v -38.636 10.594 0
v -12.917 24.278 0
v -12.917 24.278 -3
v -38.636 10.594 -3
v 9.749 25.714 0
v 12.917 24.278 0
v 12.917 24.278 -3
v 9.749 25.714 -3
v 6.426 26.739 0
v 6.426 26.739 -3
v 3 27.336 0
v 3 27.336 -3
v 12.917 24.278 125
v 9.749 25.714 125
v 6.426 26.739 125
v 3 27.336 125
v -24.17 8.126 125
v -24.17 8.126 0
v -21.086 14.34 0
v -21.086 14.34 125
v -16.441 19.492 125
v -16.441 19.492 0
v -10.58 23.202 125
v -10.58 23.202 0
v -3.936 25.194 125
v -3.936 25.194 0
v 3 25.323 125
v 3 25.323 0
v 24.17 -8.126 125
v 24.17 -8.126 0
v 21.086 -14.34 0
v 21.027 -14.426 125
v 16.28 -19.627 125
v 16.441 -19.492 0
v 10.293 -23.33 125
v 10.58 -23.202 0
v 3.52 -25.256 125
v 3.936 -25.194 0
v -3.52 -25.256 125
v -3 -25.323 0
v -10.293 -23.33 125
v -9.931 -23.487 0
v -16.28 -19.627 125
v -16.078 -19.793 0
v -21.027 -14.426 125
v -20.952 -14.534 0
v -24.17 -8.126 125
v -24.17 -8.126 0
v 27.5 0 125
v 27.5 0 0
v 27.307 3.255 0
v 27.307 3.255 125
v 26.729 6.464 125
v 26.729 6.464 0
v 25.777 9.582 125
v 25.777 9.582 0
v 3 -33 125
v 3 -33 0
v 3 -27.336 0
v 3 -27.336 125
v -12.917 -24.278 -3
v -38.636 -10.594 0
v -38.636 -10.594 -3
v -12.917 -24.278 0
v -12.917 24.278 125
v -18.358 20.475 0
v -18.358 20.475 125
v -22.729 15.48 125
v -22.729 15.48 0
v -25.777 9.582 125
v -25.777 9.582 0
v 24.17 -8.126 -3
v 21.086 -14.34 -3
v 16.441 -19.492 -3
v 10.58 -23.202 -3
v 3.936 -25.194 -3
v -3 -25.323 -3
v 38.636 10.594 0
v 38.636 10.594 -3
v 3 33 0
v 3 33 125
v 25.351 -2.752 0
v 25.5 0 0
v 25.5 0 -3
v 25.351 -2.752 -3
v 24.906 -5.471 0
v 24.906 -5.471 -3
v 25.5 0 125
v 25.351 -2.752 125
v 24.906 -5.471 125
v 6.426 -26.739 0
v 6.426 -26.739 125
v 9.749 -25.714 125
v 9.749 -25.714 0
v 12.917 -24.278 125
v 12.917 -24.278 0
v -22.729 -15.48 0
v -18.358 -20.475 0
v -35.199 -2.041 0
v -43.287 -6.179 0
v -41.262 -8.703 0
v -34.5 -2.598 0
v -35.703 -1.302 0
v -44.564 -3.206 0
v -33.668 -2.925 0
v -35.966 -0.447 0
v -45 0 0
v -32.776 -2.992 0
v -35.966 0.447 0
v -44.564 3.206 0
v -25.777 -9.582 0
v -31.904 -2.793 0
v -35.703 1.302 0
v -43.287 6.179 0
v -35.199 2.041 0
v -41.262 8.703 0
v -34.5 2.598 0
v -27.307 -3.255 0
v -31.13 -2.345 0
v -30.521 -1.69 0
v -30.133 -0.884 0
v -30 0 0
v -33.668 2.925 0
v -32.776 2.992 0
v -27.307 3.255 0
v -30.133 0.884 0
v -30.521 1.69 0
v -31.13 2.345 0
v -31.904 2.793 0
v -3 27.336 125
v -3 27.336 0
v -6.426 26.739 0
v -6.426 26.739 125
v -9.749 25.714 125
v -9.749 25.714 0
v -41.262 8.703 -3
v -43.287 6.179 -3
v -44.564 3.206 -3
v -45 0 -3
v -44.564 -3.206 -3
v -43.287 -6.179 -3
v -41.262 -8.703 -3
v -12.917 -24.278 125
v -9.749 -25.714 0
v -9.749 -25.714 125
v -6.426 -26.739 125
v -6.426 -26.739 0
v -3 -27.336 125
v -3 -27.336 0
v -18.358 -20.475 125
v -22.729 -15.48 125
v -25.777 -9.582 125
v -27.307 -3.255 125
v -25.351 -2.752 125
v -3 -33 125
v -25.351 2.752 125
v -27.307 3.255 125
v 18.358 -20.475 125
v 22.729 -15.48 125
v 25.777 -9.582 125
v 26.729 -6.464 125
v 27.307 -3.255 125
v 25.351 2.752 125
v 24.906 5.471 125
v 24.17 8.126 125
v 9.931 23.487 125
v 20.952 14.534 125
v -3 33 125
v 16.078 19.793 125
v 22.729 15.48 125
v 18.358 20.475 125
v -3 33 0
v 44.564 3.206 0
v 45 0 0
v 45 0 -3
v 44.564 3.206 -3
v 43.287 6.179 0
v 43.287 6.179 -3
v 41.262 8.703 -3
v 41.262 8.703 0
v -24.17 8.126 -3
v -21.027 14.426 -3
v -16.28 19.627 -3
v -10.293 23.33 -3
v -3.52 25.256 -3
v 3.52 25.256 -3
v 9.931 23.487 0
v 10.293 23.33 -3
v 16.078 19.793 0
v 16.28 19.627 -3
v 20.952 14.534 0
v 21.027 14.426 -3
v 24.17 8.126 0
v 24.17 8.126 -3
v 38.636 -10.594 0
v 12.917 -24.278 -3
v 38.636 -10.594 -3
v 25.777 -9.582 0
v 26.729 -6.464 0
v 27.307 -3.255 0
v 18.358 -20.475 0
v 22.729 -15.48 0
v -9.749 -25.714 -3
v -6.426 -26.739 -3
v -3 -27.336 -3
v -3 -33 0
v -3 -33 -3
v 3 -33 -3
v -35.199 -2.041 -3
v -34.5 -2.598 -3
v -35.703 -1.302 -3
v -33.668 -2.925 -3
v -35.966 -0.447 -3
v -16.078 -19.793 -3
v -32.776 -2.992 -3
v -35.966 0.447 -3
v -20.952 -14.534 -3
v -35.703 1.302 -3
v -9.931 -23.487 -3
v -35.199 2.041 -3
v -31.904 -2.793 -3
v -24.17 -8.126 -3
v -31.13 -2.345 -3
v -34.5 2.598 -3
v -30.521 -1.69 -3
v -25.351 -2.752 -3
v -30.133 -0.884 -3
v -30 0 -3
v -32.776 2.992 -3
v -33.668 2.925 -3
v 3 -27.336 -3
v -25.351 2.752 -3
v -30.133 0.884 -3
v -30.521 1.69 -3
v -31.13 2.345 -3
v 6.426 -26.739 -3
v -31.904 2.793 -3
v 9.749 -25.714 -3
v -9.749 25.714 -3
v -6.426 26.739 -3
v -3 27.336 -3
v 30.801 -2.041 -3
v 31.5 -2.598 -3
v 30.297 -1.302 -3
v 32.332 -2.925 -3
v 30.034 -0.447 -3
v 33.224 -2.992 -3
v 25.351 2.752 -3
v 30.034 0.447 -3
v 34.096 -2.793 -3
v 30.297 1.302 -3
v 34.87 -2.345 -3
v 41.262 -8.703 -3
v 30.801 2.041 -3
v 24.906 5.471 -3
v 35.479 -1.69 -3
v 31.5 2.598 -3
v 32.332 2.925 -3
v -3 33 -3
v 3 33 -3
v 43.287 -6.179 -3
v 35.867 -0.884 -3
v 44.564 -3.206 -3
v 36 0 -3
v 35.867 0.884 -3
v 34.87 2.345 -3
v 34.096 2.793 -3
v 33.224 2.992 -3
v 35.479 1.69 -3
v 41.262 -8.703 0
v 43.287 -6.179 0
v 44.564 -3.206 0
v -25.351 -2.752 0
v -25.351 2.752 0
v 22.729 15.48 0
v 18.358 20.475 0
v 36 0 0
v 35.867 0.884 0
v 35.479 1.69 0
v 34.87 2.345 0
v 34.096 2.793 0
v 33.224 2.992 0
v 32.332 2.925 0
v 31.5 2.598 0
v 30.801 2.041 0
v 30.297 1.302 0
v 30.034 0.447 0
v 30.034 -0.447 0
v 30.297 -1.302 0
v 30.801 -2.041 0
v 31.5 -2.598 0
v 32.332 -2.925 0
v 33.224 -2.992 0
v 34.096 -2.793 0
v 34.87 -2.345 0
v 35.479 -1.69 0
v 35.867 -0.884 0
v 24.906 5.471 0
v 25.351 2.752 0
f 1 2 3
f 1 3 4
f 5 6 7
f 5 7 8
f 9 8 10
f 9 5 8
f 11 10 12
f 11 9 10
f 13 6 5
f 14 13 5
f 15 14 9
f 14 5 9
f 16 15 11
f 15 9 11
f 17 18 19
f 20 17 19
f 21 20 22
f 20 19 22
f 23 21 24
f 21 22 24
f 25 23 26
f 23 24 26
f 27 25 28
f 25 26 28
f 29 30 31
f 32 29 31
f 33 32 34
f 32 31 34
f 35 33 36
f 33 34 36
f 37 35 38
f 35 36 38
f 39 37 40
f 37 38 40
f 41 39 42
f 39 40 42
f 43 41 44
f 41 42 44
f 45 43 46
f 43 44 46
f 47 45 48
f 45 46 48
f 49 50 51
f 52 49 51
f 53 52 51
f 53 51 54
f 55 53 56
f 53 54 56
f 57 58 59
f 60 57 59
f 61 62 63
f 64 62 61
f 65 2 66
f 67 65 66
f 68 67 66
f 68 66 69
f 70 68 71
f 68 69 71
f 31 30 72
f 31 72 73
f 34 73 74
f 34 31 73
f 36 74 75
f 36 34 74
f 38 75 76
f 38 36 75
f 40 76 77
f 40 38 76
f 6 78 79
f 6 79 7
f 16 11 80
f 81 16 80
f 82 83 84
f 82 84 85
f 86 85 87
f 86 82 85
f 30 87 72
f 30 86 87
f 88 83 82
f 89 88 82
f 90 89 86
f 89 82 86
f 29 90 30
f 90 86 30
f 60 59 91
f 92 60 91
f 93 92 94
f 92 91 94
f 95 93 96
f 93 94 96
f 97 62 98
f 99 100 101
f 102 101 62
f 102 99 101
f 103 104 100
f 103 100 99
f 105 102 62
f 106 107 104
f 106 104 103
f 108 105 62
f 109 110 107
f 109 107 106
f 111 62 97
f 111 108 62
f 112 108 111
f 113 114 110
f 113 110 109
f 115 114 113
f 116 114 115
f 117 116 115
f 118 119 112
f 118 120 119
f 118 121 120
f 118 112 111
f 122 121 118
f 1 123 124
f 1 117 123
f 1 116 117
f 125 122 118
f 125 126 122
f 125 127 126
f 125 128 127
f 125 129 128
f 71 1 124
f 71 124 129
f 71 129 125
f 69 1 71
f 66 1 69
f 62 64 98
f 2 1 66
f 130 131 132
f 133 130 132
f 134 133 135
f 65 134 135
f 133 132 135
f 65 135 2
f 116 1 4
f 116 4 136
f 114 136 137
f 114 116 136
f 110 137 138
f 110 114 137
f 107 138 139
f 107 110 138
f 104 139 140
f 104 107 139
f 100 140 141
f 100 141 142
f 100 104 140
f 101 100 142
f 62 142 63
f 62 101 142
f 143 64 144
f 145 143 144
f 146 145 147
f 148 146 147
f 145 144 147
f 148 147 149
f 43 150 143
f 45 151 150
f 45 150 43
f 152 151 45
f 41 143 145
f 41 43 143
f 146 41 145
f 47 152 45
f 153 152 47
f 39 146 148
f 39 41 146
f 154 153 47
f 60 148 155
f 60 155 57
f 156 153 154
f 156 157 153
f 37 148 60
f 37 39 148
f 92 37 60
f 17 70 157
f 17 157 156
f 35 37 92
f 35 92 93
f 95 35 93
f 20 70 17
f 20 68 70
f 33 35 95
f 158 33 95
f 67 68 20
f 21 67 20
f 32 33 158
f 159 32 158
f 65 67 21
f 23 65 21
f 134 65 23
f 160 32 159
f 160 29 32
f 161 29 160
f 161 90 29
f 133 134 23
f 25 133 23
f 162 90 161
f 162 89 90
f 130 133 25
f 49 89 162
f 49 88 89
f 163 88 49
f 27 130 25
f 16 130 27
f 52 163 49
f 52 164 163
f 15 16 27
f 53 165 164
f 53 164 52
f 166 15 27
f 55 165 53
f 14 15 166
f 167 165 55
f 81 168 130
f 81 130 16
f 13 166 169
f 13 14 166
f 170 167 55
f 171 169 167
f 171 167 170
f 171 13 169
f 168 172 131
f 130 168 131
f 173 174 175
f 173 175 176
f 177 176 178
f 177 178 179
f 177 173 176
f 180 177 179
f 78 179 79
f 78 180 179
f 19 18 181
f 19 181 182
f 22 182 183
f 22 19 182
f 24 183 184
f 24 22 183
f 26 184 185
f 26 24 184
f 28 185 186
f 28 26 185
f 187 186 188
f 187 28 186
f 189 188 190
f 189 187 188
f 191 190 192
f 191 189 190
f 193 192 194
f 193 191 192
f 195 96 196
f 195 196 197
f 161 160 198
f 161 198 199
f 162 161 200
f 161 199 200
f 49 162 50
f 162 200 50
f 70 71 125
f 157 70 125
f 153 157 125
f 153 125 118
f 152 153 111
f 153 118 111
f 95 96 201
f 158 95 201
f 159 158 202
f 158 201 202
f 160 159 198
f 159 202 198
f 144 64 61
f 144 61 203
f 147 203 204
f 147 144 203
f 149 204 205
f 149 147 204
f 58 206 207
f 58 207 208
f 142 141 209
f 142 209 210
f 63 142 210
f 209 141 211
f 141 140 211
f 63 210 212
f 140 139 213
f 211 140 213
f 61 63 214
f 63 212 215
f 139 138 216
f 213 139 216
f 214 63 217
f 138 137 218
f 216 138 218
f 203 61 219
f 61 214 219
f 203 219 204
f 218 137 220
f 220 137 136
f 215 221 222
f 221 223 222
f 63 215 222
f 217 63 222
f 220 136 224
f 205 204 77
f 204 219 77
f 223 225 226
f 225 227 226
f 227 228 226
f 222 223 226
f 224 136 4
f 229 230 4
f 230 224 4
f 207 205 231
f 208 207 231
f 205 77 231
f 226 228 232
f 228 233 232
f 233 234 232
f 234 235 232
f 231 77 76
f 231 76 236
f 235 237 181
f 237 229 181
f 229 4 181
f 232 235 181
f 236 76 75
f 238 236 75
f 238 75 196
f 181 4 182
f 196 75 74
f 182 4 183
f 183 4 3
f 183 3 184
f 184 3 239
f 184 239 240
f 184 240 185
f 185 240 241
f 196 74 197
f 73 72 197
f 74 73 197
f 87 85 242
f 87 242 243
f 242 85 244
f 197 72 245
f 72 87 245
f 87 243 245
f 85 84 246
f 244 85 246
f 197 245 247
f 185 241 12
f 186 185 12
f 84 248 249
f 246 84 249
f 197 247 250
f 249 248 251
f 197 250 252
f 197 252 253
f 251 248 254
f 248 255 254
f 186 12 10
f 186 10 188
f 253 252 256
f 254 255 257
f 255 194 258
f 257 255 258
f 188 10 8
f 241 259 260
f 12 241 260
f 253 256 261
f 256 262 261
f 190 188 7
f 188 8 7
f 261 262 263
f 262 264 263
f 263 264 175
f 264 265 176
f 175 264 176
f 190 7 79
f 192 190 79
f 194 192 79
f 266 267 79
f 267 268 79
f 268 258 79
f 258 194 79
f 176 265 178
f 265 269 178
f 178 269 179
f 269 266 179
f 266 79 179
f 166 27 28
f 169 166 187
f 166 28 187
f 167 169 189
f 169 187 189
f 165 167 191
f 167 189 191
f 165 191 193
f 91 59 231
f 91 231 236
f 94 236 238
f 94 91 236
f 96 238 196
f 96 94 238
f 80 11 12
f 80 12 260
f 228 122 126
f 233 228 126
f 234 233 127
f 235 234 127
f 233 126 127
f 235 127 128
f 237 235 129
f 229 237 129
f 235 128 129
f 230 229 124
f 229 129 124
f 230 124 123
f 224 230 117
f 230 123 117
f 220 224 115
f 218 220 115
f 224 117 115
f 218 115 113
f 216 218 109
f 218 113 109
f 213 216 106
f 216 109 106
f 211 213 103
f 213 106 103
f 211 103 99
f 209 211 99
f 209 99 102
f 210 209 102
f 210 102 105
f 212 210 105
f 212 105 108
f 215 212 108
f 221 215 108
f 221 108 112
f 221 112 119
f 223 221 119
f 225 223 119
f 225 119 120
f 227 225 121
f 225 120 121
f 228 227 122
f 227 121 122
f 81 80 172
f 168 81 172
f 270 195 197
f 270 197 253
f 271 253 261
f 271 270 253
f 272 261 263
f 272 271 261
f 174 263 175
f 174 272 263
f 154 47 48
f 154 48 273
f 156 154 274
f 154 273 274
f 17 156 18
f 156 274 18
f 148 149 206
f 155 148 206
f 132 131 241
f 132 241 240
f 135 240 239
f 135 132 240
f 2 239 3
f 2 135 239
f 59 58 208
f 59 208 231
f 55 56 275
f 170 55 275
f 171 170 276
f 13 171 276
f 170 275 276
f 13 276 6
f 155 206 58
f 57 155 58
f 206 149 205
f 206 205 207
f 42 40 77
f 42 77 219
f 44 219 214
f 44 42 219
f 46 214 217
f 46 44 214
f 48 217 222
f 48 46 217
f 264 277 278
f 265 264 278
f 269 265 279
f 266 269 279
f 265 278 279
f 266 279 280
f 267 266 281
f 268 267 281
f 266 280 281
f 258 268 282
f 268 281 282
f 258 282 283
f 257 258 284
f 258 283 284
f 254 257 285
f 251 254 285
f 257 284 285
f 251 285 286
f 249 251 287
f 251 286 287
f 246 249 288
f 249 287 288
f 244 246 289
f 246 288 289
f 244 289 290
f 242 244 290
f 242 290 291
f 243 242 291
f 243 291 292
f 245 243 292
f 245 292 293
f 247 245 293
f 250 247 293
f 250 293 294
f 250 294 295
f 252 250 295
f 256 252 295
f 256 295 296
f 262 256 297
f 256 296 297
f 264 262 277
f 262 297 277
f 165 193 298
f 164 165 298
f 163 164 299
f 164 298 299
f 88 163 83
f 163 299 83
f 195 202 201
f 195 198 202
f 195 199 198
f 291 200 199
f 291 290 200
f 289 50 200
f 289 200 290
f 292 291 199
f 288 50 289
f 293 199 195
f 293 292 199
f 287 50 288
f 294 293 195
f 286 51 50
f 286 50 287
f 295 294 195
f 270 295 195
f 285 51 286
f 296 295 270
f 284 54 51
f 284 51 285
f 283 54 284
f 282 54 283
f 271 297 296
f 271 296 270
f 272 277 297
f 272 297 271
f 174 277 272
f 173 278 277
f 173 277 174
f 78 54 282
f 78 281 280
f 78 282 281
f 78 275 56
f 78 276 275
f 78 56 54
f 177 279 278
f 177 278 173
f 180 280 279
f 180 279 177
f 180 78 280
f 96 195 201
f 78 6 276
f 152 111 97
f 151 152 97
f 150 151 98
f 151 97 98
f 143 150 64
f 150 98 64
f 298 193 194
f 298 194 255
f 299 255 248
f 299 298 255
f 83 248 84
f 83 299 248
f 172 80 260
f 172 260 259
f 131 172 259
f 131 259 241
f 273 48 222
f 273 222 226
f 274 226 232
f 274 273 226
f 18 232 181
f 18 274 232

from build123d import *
from build123d import SkipClean  # not in build123d's __all__

# Parameters (mm, degrees)
F0_R     = 3
F1_DEPTH = 3
F2_DEPTH = 125


# Not quite as in the source:
# - a feature names something its author has since deleted; it is built from what else it names


with BuildPart() as f1:
    # F0 (on Top) → F1 (new body)
    with BuildSketch(Plane.XY):
        with BuildLine():
            ThreePointArc((12.9166666896, 24.2777618744), (20.6949130465, 18.1099578685), (25.7765151515, 9.5823413967))
            ThreePointArc((25.7765151515, 9.5823413967), (32.0589540907, 11.9630444535), (38.6363637791, 10.5939323837))
            Line((38.6363637791, 10.5939323837), (12.9166666896, 24.2777618744))
        make_face()
        with BuildLine():
            ThreePointArc((25.7765151515, 9.5823413967), (27.0656993875, 4.8680506023), (27.5, 0))
            ThreePointArc((27.5, 0), (27.0656993875, -4.8680506023), (25.7765151515, -9.5823413967))
            ThreePointArc((25.7765151515, -9.5823413967), (32.0589541175, -11.9630444556), (38.6363638266, -10.5939323584))
            ThreePointArc((38.6363638266, -10.5939323584), (43.2867965353, -6.1791437142), (45, 0))
            ThreePointArc((45, 0), (43.2867965215, 6.1791437372), (38.6363637791, 10.5939323837))
            ThreePointArc((38.6363637791, 10.5939323837), (32.0589540907, 11.9630444535), (25.7765151515, 9.5823413967))
        make_face()
        with Locations((33, 0)):
            Circle(F0_R, mode=Mode.SUBTRACT)
        with BuildLine():
            ThreePointArc((25.7765151515, -9.5823413967), (27.0656993875, -4.8680506023), (27.5, 0))
            ThreePointArc((27.5, 0), (27.0656993875, 4.8680506023), (25.7765151515, 9.5823413967))
            ThreePointArc((25.7765151515, 9.5823413967), (24.9405426226, 8.8907337595), (24.1704545455, 8.1264461523))
            ThreePointArc((24.1704545455, 8.1264461523), (25.1654186425, 4.117244776), (25.5, 0))
            ThreePointArc((25.5, 0), (25.1654186425, -4.117244776), (24.1704545455, -8.1264461523))
            ThreePointArc((24.1704545455, -8.1264461523), (24.9405426226, -8.8907337595), (25.7765151515, -9.5823413967))
        make_face()
        with BuildLine():
            ThreePointArc((-3, 27.3358738657), (0, 27.5), (3, 27.3358738657))
            Line((3, 27.3358738657), (3, 33))
            Line((3, 33), (-3, 33))
            Line((-3, 33), (-3, 27.3358738657))
        make_face()
        with BuildLine():
            ThreePointArc((38.6363638266, -10.5939323584), (32.0589541175, -11.9630444556), (25.7765151515, -9.5823413967))
            ThreePointArc((25.7765151515, -9.5823413967), (20.6949131964, -18.1099576972), (12.9166670915, -24.2777616606))
            Line((12.9166670915, -24.2777616606), (38.6363638266, -10.5939323584))
        make_face()
        with BuildLine():
            ThreePointArc((-25.7765151515, 9.5823413967), (-20.6949129227, 18.1099580099), (-12.9166663578, 24.2777620509))
            Line((-12.9166663578, 24.2777620509), (-38.636363452, 10.5939325577))
            ThreePointArc((-38.636363452, 10.5939325577), (-32.058953906, 11.963044439), (-25.7765151515, 9.5823413967))
        make_face()
        with BuildLine():
            ThreePointArc((-25.7765151515, -9.5823413967), (-27.5, 0), (-25.7765151515, 9.5823413967))
            ThreePointArc((-25.7765151515, 9.5823413967), (-32.058953906, 11.963044439), (-38.636363452, 10.5939325577))
            ThreePointArc((-38.636363452, 10.5939325577), (-45, 1.496e-07), (-38.6363637162, -10.5939324171))
            ThreePointArc((-38.6363637162, -10.5939324171), (-32.0589540552, -11.9630444507), (-25.7765151515, -9.5823413967))
        make_face()
        with Locations((-33, 0)):
            Circle(F0_R, mode=Mode.SUBTRACT)
        with BuildLine():
            ThreePointArc((-24.1704545455, -8.1264461523), (-25.5, 0), (-24.1704545455, 8.1264461523))
            ThreePointArc((-24.1704545455, 8.1264461523), (-24.9405426226, 8.8907337595), (-25.7765151515, 9.5823413967))
            ThreePointArc((-25.7765151515, 9.5823413967), (-27.5, 0), (-25.7765151515, -9.5823413967))
            ThreePointArc((-25.7765151515, -9.5823413967), (-24.9405426226, -8.8907337595), (-24.1704545455, -8.1264461523))
        make_face()
        with BuildLine():
            Line((-38.6363637162, -10.5939324171), (-12.9166665881, -24.2777619284))
            ThreePointArc((-12.9166665881, -24.2777619284), (-20.6949130086, -18.1099579118), (-25.7765151515, -9.5823413967))
            ThreePointArc((-25.7765151515, -9.5823413967), (-32.0589540552, -11.9630444507), (-38.6363637162, -10.5939324171))
        make_face()
        with BuildLine():
            Line((3, 25.3229145242), (3, 27.3358738657))
            ThreePointArc((3, 27.3358738657), (0, 27.5), (-3, 27.3358738657))
            Line((-3, 27.3358738657), (-3, 25.3229145242))
            ThreePointArc((-3, 25.3229145242), (0, 25.5), (3, 25.3229145242))
        make_face()
        with BuildLine():
            ThreePointArc((24.1704545455, 8.1264461523), (24.9405426226, 8.8907337595), (25.7765151515, 9.5823413967))
            ThreePointArc((25.7765151515, 9.5823413967), (20.6949130465, 18.1099578685), (12.9166666896, 24.2777618744))
            ThreePointArc((12.9166666896, 24.2777618744), (8.1038930067, 26.2788302277), (3, 27.3358738657))
            Line((3, 27.3358738657), (3, 25.3229145242))
            ThreePointArc((3, 25.3229145242), (16.0775629735, 19.7929777657), (24.1704545455, 8.1264461523))
        make_face()
        with BuildLine():
            Line((-3, 25.3229145242), (-3, 27.3358738657))
            ThreePointArc((-3, 27.3358738657), (-8.1038928272, 26.2788302831), (-12.9166663578, 24.2777620509))
            ThreePointArc((-12.9166663578, 24.2777620509), (-20.6949129227, 18.1099580099), (-25.7765151515, 9.5823413967))
            ThreePointArc((-25.7765151515, 9.5823413967), (-24.9405426226, 8.8907337595), (-24.1704545455, 8.1264461523))
            ThreePointArc((-24.1704545455, 8.1264461523), (-16.0775629735, 19.7929777657), (-3, 25.3229145242))
        make_face()
        with BuildLine():
            ThreePointArc((-3, -27.3358738657), (0, -27.5), (3, -27.3358738657))
            Line((3, -27.3358738657), (3, -25.3229145242))
            ThreePointArc((3, -25.3229145242), (0, -25.5), (-3, -25.3229145242))
            Line((-3, -25.3229145242), (-3, -27.3358738657))
        make_face()
        with BuildLine():
            Line((3, -33), (3, -27.3358738657))
            ThreePointArc((3, -27.3358738657), (0, -27.5), (-3, -27.3358738657))
            Line((-3, -27.3358738657), (-3, -33))
            Line((-3, -33), (3, -33))
        make_face()
        with BuildLine():
            ThreePointArc((12.9166670915, -24.2777616606), (20.6949131964, -18.1099576972), (25.7765151515, -9.5823413967))
            ThreePointArc((25.7765151515, -9.5823413967), (24.9405426226, -8.8907337595), (24.1704545455, -8.1264461523))
            ThreePointArc((24.1704545455, -8.1264461523), (16.0775629735, -19.7929777657), (3, -25.3229145242))
            Line((3, -25.3229145242), (3, -27.3358738657))
            ThreePointArc((3, -27.3358738657), (8.1038932243, -26.2788301606), (12.9166670915, -24.2777616606))
        make_face()
        with BuildLine():
            ThreePointArc((-12.9166665881, -24.2777619284), (-8.1038929518, -26.2788302446), (-3, -27.3358738657))
            Line((-3, -27.3358738657), (-3, -25.3229145242))
            ThreePointArc((-3, -25.3229145242), (-16.0775629735, -19.7929777657), (-24.1704545455, -8.1264461523))
            ThreePointArc((-24.1704545455, -8.1264461523), (-24.9405426226, -8.8907337595), (-25.7765151515, -9.5823413967))
            ThreePointArc((-25.7765151515, -9.5823413967), (-20.6949130086, -18.1099579118), (-12.9166665881, -24.2777619284))
        make_face()
    extrude(amount=-F1_DEPTH)

    # F0 (on Top) → F2 (join)
    with BuildSketch(Plane.XY):
        with BuildLine():
            Line((-3, 25.3229145242), (-3, 27.3358738657))
            ThreePointArc((-3, 27.3358738657), (-8.1038928272, 26.2788302831), (-12.9166663578, 24.2777620509))
            ThreePointArc((-12.9166663578, 24.2777620509), (-20.6949129227, 18.1099580099), (-25.7765151515, 9.5823413967))
            ThreePointArc((-25.7765151515, 9.5823413967), (-24.9405426226, 8.8907337595), (-24.1704545455, 8.1264461523))
            ThreePointArc((-24.1704545455, 8.1264461523), (-16.0775629735, 19.7929777657), (-3, 25.3229145242))
        make_face()
        with BuildLine():
            ThreePointArc((-3, 27.3358738657), (0, 27.5), (3, 27.3358738657))
            Line((3, 27.3358738657), (3, 33))
            Line((3, 33), (-3, 33))
            Line((-3, 33), (-3, 27.3358738657))
        make_face()
        with BuildLine():
            Line((3, 25.3229145242), (3, 27.3358738657))
            ThreePointArc((3, 27.3358738657), (0, 27.5), (-3, 27.3358738657))
            Line((-3, 27.3358738657), (-3, 25.3229145242))
            ThreePointArc((-3, 25.3229145242), (0, 25.5), (3, 25.3229145242))
        make_face()
        with BuildLine():
            ThreePointArc((24.1704545455, 8.1264461523), (24.9405426226, 8.8907337595), (25.7765151515, 9.5823413967))
            ThreePointArc((25.7765151515, 9.5823413967), (20.6949130465, 18.1099578685), (12.9166666896, 24.2777618744))
            ThreePointArc((12.9166666896, 24.2777618744), (8.1038930067, 26.2788302277), (3, 27.3358738657))
            Line((3, 27.3358738657), (3, 25.3229145242))
            ThreePointArc((3, 25.3229145242), (16.0775629735, 19.7929777657), (24.1704545455, 8.1264461523))
        make_face()
        with BuildLine():
            Line((3, -33), (3, -27.3358738657))
            ThreePointArc((3, -27.3358738657), (0, -27.5), (-3, -27.3358738657))
            Line((-3, -27.3358738657), (-3, -33))
            Line((-3, -33), (3, -33))
        make_face()
        with BuildLine():
            ThreePointArc((-24.1704545455, -8.1264461523), (-25.5, 0), (-24.1704545455, 8.1264461523))
            ThreePointArc((-24.1704545455, 8.1264461523), (-24.9405426226, 8.8907337595), (-25.7765151515, 9.5823413967))
            ThreePointArc((-25.7765151515, 9.5823413967), (-27.5, 0), (-25.7765151515, -9.5823413967))
            ThreePointArc((-25.7765151515, -9.5823413967), (-24.9405426226, -8.8907337595), (-24.1704545455, -8.1264461523))
        make_face()
        with BuildLine():
            ThreePointArc((25.7765151515, -9.5823413967), (27.0656993875, -4.8680506023), (27.5, 0))
            ThreePointArc((27.5, 0), (27.0656993875, 4.8680506023), (25.7765151515, 9.5823413967))
            ThreePointArc((25.7765151515, 9.5823413967), (24.9405426226, 8.8907337595), (24.1704545455, 8.1264461523))
            ThreePointArc((24.1704545455, 8.1264461523), (25.1654186425, 4.117244776), (25.5, 0))
            ThreePointArc((25.5, 0), (25.1654186425, -4.117244776), (24.1704545455, -8.1264461523))
            ThreePointArc((24.1704545455, -8.1264461523), (24.9405426226, -8.8907337595), (25.7765151515, -9.5823413967))
        make_face()
        with BuildLine():
            ThreePointArc((-3, -27.3358738657), (0, -27.5), (3, -27.3358738657))
            Line((3, -27.3358738657), (3, -25.3229145242))
            ThreePointArc((3, -25.3229145242), (0, -25.5), (-3, -25.3229145242))
            Line((-3, -25.3229145242), (-3, -27.3358738657))
        make_face()
        with BuildLine():
            ThreePointArc((-12.9166665881, -24.2777619284), (-8.1038929518, -26.2788302446), (-3, -27.3358738657))
            Line((-3, -27.3358738657), (-3, -25.3229145242))
            ThreePointArc((-3, -25.3229145242), (-16.0775629735, -19.7929777657), (-24.1704545455, -8.1264461523))
            ThreePointArc((-24.1704545455, -8.1264461523), (-24.9405426226, -8.8907337595), (-25.7765151515, -9.5823413967))
            ThreePointArc((-25.7765151515, -9.5823413967), (-20.6949130086, -18.1099579118), (-12.9166665881, -24.2777619284))
        make_face()
        with BuildLine():
            ThreePointArc((12.9166670915, -24.2777616606), (20.6949131964, -18.1099576972), (25.7765151515, -9.5823413967))
            ThreePointArc((25.7765151515, -9.5823413967), (24.9405426226, -8.8907337595), (24.1704545455, -8.1264461523))
            ThreePointArc((24.1704545455, -8.1264461523), (16.0775629735, -19.7929777657), (3, -25.3229145242))
            Line((3, -25.3229145242), (3, -27.3358738657))
            ThreePointArc((3, -27.3358738657), (8.1038932243, -26.2788301606), (12.9166670915, -24.2777616606))
        make_face()
    with SkipClean():  # cleaning this boolean's faces spoils the solid; the shape is the same uncleaned
        extrude(amount=F2_DEPTH)


solid = f1.part
